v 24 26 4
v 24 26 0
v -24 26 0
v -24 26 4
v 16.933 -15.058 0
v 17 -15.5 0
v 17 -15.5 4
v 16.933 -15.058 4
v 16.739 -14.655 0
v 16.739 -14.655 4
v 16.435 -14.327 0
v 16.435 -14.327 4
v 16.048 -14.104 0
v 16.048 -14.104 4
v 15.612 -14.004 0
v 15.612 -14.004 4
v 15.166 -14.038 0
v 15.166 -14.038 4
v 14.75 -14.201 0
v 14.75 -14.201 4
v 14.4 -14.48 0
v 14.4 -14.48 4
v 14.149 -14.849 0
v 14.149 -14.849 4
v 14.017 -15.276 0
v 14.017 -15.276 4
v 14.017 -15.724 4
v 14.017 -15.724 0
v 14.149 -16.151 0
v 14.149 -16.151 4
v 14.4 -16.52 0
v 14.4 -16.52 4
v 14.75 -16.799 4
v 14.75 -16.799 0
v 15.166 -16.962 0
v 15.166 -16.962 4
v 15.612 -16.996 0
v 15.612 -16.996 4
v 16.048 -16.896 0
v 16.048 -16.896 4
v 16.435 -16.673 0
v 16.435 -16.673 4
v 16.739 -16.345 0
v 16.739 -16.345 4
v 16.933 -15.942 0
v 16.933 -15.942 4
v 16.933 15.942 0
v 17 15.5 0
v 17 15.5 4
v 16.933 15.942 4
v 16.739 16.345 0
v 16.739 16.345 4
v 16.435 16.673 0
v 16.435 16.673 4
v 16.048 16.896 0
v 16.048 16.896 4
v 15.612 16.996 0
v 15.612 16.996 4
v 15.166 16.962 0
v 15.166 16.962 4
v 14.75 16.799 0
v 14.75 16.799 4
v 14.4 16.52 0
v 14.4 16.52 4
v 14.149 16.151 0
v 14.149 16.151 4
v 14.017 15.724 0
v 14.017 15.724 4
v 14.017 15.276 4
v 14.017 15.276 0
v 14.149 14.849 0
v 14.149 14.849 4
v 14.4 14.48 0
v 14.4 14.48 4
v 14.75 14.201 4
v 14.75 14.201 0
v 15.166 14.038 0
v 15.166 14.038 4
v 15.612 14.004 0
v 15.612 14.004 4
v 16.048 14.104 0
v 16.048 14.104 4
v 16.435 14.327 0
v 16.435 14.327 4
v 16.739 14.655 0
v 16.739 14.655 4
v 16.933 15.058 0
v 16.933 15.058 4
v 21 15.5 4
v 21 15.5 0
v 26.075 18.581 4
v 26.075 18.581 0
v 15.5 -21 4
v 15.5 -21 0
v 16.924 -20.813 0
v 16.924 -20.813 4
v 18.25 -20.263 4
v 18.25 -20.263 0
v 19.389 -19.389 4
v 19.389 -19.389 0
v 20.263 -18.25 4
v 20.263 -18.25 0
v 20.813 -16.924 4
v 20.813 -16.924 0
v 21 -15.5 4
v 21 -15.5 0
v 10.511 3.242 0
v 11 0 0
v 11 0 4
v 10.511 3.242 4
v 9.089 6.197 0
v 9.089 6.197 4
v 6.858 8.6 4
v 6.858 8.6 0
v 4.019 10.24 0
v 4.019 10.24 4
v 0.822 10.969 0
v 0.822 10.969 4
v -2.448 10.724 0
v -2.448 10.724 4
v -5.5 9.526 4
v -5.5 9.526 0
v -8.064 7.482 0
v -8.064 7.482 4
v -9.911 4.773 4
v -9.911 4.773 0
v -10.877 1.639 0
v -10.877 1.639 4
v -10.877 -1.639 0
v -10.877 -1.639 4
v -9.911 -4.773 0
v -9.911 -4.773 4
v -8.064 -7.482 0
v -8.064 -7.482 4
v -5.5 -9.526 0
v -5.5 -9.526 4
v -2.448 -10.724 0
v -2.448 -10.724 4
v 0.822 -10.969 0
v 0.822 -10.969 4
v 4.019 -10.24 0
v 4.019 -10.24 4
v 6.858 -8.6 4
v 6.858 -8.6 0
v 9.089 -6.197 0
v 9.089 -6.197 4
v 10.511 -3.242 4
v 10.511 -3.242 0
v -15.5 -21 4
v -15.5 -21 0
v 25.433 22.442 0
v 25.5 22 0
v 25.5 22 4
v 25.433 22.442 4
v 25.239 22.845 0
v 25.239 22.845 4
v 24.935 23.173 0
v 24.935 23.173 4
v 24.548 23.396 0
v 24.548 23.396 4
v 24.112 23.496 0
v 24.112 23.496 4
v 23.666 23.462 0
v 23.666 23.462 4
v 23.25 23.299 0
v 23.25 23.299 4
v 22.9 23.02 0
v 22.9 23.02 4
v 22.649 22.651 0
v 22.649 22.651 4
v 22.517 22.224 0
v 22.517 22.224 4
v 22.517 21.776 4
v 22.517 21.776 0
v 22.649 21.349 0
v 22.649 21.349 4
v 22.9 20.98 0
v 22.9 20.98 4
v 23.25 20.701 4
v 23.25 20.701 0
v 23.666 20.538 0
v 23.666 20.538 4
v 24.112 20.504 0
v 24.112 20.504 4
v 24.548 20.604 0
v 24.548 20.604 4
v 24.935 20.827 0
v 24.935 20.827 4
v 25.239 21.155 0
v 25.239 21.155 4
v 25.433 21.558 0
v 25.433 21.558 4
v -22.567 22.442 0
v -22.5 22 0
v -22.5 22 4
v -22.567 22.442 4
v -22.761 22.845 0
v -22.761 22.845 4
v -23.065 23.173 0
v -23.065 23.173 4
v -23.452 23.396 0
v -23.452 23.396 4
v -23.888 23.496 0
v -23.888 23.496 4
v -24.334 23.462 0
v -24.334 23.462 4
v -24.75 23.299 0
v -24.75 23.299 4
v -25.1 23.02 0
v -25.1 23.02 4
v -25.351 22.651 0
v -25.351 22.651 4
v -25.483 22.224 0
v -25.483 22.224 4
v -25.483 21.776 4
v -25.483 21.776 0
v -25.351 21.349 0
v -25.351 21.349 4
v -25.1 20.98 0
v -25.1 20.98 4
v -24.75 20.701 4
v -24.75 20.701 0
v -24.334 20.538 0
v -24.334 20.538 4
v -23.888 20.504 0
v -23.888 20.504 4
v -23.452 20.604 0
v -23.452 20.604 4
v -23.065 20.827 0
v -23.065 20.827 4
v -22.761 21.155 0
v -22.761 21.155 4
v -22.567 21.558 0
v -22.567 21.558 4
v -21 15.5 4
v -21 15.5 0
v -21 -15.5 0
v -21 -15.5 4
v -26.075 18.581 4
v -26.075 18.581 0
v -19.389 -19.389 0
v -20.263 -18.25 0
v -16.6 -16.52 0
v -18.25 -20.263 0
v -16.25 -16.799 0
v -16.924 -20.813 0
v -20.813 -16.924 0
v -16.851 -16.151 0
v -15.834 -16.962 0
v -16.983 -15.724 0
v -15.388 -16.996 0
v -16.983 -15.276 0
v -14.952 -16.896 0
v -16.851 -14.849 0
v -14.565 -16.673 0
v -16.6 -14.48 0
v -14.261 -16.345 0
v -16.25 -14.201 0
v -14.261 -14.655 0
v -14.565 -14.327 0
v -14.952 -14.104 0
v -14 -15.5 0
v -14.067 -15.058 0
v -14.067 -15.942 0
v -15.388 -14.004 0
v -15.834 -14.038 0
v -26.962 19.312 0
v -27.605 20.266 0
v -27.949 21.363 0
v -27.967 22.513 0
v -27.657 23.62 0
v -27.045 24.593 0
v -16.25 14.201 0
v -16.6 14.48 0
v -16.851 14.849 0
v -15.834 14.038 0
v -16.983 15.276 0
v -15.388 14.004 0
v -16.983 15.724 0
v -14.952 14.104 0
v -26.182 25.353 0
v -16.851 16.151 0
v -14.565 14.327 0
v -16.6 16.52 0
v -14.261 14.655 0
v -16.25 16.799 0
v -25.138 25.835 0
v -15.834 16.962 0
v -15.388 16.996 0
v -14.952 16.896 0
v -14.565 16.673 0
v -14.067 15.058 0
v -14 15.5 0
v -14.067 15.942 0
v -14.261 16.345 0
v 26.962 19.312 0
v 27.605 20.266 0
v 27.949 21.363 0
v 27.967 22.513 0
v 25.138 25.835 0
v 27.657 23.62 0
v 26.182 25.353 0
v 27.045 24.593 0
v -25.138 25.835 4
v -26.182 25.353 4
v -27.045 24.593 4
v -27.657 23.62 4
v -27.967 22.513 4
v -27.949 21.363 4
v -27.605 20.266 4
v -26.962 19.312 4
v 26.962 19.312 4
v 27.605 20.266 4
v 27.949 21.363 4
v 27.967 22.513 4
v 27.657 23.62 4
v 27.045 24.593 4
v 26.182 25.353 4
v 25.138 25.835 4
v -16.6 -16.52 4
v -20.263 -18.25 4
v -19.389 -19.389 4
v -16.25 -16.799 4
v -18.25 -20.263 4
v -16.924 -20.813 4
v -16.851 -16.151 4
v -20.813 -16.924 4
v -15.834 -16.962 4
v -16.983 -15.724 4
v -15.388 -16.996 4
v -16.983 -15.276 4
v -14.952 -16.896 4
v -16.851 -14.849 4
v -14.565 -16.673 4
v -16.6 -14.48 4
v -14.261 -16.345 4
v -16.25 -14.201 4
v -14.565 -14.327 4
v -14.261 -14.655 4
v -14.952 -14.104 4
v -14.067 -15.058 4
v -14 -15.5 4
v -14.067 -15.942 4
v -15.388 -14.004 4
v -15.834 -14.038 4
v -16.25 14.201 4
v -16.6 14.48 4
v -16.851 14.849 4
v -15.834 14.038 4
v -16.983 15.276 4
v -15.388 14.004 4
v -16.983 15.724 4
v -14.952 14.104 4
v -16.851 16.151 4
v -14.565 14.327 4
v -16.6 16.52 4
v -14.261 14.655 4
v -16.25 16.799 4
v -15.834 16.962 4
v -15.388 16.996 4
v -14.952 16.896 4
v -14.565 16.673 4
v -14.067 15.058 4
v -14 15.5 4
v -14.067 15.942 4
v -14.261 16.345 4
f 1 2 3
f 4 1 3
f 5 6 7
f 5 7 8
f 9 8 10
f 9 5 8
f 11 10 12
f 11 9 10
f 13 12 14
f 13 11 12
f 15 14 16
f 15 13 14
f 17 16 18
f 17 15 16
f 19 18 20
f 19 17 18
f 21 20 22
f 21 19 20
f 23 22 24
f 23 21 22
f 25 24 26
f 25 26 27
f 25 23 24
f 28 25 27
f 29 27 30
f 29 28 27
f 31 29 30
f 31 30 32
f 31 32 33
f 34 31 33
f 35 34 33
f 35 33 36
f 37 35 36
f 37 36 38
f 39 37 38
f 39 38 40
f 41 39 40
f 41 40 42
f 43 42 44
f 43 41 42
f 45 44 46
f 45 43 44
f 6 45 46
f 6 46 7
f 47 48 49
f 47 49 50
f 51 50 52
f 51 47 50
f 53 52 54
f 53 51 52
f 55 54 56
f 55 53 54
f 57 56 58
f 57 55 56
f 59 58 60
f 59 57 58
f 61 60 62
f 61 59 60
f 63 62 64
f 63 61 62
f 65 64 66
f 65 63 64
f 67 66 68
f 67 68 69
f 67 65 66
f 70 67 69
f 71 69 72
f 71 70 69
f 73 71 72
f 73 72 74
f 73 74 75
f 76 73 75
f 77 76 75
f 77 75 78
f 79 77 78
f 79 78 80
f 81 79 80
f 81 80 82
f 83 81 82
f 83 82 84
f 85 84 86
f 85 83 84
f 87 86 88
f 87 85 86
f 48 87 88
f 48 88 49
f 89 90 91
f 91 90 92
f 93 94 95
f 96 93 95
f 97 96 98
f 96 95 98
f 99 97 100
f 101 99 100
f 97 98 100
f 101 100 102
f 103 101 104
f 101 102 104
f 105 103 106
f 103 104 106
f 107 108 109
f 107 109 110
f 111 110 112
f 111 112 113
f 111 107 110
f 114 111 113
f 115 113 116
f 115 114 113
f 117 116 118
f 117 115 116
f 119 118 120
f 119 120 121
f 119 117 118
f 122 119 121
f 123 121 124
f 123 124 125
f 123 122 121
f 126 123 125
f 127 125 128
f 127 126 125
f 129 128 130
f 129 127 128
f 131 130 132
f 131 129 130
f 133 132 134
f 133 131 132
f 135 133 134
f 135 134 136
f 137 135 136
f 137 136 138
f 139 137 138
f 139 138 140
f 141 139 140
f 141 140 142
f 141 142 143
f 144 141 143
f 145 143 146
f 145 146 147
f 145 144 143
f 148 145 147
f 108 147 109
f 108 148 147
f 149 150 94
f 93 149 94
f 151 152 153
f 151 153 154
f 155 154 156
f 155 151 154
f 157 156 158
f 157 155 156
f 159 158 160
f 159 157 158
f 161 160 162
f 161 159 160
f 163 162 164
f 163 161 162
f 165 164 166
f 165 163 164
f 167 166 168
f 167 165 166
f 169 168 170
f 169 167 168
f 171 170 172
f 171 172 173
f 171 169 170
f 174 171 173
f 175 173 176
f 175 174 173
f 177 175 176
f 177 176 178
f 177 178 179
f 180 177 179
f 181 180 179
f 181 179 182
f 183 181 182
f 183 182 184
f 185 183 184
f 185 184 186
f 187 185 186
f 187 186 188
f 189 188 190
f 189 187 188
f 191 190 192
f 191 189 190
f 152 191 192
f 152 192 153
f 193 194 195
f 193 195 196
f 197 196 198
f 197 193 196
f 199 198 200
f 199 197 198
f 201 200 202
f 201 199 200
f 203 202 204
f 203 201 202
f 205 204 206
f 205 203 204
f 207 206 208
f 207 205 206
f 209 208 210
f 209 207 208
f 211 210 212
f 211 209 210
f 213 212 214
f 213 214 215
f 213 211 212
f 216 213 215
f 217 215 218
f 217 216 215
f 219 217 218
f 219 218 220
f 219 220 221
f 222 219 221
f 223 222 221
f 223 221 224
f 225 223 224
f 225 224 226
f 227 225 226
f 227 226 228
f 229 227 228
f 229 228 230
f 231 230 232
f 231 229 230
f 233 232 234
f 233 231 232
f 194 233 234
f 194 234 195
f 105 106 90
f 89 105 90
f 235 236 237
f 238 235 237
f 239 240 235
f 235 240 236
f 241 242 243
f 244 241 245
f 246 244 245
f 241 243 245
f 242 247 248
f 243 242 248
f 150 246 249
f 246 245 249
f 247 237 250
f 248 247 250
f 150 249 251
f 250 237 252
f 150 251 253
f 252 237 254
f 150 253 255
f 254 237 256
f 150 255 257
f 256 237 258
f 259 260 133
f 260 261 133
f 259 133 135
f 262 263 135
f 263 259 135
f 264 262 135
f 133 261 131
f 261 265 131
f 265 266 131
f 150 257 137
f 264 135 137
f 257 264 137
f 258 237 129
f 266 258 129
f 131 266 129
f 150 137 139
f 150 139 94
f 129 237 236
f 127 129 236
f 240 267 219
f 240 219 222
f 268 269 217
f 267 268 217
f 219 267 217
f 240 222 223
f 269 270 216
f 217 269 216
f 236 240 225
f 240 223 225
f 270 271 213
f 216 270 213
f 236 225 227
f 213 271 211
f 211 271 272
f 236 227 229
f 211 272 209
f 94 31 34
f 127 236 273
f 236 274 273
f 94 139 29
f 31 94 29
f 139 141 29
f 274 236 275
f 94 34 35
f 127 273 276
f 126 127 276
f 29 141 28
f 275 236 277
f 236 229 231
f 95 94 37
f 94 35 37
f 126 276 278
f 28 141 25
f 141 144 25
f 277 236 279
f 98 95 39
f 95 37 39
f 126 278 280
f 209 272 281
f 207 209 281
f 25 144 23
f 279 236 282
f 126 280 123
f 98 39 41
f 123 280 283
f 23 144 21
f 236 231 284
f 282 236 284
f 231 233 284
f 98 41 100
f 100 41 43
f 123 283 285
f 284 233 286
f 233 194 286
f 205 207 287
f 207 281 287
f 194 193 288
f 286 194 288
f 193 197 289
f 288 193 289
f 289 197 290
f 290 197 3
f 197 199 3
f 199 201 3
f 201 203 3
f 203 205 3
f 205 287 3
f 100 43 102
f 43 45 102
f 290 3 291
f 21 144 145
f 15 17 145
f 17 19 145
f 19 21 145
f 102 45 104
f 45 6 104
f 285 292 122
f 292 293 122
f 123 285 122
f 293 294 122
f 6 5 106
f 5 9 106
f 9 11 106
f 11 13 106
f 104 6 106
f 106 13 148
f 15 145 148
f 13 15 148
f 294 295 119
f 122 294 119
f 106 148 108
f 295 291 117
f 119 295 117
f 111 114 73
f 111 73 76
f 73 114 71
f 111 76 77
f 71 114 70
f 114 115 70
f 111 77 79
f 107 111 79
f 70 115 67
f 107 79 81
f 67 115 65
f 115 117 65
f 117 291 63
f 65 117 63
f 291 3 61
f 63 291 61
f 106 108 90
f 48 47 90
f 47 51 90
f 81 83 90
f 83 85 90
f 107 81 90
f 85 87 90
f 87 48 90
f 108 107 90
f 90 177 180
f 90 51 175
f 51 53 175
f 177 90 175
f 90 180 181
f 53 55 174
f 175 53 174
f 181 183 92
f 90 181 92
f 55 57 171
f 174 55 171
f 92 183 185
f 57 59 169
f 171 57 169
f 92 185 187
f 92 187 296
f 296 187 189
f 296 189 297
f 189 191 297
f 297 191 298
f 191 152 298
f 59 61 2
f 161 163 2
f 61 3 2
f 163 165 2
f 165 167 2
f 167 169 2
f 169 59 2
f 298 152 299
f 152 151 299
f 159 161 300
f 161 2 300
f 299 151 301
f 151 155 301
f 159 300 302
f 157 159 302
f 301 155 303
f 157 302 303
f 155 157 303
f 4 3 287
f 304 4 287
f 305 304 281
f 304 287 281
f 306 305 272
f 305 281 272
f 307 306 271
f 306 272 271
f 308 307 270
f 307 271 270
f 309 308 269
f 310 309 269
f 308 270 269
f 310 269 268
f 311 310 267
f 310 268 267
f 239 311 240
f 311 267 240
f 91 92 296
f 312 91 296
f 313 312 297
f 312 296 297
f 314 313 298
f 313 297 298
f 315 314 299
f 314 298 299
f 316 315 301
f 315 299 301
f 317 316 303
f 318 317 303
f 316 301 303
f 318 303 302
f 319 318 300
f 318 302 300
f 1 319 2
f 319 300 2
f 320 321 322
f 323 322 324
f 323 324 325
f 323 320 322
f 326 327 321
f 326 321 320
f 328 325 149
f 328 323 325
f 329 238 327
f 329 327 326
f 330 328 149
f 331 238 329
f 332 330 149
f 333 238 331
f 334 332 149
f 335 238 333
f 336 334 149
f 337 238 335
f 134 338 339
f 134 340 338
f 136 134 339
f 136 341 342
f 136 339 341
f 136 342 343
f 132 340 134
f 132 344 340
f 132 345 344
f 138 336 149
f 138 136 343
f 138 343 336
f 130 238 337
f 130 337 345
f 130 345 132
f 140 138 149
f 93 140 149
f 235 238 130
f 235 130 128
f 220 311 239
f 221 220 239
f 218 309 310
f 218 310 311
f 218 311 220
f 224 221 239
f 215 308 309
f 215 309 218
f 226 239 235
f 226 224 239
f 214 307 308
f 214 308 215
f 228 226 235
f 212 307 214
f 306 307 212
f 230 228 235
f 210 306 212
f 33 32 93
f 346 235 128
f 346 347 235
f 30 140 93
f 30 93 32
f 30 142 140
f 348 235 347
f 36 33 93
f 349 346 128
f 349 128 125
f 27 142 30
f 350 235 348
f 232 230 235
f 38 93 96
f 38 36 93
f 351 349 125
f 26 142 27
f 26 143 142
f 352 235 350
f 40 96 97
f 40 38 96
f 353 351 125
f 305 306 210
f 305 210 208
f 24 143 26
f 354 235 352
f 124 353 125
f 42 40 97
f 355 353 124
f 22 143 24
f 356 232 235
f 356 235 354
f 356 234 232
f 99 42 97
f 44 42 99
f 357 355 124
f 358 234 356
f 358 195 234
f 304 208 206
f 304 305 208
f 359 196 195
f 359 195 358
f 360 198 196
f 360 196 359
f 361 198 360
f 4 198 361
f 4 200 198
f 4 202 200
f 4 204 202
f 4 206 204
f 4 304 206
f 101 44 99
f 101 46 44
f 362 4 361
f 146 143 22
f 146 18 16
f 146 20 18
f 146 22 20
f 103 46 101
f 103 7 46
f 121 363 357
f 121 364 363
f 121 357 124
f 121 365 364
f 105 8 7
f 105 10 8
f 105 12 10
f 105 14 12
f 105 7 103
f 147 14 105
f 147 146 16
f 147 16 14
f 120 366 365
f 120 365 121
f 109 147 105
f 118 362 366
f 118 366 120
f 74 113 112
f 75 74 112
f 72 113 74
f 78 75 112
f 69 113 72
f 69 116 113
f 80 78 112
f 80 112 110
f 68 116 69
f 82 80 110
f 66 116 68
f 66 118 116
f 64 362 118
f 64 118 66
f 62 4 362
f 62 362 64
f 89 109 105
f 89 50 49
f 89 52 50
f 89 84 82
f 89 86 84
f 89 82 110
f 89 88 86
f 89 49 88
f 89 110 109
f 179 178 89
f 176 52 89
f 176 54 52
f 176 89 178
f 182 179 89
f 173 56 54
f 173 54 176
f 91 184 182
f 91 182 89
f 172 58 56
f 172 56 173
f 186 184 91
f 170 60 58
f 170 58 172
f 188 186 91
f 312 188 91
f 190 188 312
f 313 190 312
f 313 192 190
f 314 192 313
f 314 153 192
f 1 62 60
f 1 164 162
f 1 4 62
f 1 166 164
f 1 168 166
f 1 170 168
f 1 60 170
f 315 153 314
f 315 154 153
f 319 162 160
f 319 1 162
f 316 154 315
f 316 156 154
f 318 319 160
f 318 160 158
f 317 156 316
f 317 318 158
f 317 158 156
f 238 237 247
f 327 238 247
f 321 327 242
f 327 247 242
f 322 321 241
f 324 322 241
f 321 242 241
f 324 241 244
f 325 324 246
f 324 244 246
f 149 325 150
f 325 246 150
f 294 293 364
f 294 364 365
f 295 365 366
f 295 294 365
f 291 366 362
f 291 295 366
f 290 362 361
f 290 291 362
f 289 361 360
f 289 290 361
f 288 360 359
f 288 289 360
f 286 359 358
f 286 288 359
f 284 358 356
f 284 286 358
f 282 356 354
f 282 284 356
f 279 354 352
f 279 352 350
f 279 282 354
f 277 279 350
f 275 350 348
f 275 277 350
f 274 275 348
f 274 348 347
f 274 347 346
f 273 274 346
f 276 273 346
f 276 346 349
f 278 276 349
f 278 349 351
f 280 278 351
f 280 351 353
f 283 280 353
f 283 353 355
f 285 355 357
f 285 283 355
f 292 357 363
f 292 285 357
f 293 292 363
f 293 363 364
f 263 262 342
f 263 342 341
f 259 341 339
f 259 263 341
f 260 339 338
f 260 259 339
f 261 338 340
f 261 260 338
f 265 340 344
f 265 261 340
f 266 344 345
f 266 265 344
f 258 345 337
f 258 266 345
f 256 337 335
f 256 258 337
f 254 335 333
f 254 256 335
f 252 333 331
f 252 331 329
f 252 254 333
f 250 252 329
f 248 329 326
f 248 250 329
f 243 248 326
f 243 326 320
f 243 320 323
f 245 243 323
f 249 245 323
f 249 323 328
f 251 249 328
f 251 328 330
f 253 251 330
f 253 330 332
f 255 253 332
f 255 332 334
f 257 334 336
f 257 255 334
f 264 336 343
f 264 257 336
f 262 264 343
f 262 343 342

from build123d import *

# Parameters (mm, degrees)
F0_R     = 1.5
F0_R_2   = 11
F1_DEPTH = 4


with BuildPart() as f1:
    # F0 (on Top) → F1 (new body)
    with BuildSketch(Plane.XY):
        with BuildLine():
            ThreePointArc((-21, -15.5), (-19.389087, -19.389087), (-15.5, -21))
            Line((-15.5, -21), (15.5, -21))
            ThreePointArc((15.5, -21), (19.389087, -19.389087), (21, -15.5))
            Line((21, -15.5), (21, 15.5))
            Line((21, 15.5), (26.075443, 18.580565))
            ThreePointArc((26.075443, 18.580565), (27.852125, 23.077557), (24, 26))
            Line((24, 26), (-24, 26))
            ThreePointArc((-24, 26), (-27.852125, 23.077557), (-26.075443, 18.580565))
            Line((-26.075443, 18.580565), (-21, 15.5))
            Line((-21, 15.5), (-21, -15.5))
        make_face()
        with Locations((-15.5, -15.5)):
            Circle(F0_R, mode=Mode.SUBTRACT)
        with Locations((15.5, -15.5)):
            Circle(F0_R, mode=Mode.SUBTRACT)
        Circle(F0_R_2, mode=Mode.SUBTRACT)
        with Locations((-15.5, 15.5)):
            Circle(F0_R, mode=Mode.SUBTRACT)
        with Locations((-24, 22)):
            Circle(F0_R, mode=Mode.SUBTRACT)
        with Locations((15.5, 15.5)):
            Circle(F0_R, mode=Mode.SUBTRACT)
        with Locations((24, 22)):
            Circle(F0_R, mode=Mode.SUBTRACT)
    extrude(amount=F1_DEPTH)


solid = f1.part
